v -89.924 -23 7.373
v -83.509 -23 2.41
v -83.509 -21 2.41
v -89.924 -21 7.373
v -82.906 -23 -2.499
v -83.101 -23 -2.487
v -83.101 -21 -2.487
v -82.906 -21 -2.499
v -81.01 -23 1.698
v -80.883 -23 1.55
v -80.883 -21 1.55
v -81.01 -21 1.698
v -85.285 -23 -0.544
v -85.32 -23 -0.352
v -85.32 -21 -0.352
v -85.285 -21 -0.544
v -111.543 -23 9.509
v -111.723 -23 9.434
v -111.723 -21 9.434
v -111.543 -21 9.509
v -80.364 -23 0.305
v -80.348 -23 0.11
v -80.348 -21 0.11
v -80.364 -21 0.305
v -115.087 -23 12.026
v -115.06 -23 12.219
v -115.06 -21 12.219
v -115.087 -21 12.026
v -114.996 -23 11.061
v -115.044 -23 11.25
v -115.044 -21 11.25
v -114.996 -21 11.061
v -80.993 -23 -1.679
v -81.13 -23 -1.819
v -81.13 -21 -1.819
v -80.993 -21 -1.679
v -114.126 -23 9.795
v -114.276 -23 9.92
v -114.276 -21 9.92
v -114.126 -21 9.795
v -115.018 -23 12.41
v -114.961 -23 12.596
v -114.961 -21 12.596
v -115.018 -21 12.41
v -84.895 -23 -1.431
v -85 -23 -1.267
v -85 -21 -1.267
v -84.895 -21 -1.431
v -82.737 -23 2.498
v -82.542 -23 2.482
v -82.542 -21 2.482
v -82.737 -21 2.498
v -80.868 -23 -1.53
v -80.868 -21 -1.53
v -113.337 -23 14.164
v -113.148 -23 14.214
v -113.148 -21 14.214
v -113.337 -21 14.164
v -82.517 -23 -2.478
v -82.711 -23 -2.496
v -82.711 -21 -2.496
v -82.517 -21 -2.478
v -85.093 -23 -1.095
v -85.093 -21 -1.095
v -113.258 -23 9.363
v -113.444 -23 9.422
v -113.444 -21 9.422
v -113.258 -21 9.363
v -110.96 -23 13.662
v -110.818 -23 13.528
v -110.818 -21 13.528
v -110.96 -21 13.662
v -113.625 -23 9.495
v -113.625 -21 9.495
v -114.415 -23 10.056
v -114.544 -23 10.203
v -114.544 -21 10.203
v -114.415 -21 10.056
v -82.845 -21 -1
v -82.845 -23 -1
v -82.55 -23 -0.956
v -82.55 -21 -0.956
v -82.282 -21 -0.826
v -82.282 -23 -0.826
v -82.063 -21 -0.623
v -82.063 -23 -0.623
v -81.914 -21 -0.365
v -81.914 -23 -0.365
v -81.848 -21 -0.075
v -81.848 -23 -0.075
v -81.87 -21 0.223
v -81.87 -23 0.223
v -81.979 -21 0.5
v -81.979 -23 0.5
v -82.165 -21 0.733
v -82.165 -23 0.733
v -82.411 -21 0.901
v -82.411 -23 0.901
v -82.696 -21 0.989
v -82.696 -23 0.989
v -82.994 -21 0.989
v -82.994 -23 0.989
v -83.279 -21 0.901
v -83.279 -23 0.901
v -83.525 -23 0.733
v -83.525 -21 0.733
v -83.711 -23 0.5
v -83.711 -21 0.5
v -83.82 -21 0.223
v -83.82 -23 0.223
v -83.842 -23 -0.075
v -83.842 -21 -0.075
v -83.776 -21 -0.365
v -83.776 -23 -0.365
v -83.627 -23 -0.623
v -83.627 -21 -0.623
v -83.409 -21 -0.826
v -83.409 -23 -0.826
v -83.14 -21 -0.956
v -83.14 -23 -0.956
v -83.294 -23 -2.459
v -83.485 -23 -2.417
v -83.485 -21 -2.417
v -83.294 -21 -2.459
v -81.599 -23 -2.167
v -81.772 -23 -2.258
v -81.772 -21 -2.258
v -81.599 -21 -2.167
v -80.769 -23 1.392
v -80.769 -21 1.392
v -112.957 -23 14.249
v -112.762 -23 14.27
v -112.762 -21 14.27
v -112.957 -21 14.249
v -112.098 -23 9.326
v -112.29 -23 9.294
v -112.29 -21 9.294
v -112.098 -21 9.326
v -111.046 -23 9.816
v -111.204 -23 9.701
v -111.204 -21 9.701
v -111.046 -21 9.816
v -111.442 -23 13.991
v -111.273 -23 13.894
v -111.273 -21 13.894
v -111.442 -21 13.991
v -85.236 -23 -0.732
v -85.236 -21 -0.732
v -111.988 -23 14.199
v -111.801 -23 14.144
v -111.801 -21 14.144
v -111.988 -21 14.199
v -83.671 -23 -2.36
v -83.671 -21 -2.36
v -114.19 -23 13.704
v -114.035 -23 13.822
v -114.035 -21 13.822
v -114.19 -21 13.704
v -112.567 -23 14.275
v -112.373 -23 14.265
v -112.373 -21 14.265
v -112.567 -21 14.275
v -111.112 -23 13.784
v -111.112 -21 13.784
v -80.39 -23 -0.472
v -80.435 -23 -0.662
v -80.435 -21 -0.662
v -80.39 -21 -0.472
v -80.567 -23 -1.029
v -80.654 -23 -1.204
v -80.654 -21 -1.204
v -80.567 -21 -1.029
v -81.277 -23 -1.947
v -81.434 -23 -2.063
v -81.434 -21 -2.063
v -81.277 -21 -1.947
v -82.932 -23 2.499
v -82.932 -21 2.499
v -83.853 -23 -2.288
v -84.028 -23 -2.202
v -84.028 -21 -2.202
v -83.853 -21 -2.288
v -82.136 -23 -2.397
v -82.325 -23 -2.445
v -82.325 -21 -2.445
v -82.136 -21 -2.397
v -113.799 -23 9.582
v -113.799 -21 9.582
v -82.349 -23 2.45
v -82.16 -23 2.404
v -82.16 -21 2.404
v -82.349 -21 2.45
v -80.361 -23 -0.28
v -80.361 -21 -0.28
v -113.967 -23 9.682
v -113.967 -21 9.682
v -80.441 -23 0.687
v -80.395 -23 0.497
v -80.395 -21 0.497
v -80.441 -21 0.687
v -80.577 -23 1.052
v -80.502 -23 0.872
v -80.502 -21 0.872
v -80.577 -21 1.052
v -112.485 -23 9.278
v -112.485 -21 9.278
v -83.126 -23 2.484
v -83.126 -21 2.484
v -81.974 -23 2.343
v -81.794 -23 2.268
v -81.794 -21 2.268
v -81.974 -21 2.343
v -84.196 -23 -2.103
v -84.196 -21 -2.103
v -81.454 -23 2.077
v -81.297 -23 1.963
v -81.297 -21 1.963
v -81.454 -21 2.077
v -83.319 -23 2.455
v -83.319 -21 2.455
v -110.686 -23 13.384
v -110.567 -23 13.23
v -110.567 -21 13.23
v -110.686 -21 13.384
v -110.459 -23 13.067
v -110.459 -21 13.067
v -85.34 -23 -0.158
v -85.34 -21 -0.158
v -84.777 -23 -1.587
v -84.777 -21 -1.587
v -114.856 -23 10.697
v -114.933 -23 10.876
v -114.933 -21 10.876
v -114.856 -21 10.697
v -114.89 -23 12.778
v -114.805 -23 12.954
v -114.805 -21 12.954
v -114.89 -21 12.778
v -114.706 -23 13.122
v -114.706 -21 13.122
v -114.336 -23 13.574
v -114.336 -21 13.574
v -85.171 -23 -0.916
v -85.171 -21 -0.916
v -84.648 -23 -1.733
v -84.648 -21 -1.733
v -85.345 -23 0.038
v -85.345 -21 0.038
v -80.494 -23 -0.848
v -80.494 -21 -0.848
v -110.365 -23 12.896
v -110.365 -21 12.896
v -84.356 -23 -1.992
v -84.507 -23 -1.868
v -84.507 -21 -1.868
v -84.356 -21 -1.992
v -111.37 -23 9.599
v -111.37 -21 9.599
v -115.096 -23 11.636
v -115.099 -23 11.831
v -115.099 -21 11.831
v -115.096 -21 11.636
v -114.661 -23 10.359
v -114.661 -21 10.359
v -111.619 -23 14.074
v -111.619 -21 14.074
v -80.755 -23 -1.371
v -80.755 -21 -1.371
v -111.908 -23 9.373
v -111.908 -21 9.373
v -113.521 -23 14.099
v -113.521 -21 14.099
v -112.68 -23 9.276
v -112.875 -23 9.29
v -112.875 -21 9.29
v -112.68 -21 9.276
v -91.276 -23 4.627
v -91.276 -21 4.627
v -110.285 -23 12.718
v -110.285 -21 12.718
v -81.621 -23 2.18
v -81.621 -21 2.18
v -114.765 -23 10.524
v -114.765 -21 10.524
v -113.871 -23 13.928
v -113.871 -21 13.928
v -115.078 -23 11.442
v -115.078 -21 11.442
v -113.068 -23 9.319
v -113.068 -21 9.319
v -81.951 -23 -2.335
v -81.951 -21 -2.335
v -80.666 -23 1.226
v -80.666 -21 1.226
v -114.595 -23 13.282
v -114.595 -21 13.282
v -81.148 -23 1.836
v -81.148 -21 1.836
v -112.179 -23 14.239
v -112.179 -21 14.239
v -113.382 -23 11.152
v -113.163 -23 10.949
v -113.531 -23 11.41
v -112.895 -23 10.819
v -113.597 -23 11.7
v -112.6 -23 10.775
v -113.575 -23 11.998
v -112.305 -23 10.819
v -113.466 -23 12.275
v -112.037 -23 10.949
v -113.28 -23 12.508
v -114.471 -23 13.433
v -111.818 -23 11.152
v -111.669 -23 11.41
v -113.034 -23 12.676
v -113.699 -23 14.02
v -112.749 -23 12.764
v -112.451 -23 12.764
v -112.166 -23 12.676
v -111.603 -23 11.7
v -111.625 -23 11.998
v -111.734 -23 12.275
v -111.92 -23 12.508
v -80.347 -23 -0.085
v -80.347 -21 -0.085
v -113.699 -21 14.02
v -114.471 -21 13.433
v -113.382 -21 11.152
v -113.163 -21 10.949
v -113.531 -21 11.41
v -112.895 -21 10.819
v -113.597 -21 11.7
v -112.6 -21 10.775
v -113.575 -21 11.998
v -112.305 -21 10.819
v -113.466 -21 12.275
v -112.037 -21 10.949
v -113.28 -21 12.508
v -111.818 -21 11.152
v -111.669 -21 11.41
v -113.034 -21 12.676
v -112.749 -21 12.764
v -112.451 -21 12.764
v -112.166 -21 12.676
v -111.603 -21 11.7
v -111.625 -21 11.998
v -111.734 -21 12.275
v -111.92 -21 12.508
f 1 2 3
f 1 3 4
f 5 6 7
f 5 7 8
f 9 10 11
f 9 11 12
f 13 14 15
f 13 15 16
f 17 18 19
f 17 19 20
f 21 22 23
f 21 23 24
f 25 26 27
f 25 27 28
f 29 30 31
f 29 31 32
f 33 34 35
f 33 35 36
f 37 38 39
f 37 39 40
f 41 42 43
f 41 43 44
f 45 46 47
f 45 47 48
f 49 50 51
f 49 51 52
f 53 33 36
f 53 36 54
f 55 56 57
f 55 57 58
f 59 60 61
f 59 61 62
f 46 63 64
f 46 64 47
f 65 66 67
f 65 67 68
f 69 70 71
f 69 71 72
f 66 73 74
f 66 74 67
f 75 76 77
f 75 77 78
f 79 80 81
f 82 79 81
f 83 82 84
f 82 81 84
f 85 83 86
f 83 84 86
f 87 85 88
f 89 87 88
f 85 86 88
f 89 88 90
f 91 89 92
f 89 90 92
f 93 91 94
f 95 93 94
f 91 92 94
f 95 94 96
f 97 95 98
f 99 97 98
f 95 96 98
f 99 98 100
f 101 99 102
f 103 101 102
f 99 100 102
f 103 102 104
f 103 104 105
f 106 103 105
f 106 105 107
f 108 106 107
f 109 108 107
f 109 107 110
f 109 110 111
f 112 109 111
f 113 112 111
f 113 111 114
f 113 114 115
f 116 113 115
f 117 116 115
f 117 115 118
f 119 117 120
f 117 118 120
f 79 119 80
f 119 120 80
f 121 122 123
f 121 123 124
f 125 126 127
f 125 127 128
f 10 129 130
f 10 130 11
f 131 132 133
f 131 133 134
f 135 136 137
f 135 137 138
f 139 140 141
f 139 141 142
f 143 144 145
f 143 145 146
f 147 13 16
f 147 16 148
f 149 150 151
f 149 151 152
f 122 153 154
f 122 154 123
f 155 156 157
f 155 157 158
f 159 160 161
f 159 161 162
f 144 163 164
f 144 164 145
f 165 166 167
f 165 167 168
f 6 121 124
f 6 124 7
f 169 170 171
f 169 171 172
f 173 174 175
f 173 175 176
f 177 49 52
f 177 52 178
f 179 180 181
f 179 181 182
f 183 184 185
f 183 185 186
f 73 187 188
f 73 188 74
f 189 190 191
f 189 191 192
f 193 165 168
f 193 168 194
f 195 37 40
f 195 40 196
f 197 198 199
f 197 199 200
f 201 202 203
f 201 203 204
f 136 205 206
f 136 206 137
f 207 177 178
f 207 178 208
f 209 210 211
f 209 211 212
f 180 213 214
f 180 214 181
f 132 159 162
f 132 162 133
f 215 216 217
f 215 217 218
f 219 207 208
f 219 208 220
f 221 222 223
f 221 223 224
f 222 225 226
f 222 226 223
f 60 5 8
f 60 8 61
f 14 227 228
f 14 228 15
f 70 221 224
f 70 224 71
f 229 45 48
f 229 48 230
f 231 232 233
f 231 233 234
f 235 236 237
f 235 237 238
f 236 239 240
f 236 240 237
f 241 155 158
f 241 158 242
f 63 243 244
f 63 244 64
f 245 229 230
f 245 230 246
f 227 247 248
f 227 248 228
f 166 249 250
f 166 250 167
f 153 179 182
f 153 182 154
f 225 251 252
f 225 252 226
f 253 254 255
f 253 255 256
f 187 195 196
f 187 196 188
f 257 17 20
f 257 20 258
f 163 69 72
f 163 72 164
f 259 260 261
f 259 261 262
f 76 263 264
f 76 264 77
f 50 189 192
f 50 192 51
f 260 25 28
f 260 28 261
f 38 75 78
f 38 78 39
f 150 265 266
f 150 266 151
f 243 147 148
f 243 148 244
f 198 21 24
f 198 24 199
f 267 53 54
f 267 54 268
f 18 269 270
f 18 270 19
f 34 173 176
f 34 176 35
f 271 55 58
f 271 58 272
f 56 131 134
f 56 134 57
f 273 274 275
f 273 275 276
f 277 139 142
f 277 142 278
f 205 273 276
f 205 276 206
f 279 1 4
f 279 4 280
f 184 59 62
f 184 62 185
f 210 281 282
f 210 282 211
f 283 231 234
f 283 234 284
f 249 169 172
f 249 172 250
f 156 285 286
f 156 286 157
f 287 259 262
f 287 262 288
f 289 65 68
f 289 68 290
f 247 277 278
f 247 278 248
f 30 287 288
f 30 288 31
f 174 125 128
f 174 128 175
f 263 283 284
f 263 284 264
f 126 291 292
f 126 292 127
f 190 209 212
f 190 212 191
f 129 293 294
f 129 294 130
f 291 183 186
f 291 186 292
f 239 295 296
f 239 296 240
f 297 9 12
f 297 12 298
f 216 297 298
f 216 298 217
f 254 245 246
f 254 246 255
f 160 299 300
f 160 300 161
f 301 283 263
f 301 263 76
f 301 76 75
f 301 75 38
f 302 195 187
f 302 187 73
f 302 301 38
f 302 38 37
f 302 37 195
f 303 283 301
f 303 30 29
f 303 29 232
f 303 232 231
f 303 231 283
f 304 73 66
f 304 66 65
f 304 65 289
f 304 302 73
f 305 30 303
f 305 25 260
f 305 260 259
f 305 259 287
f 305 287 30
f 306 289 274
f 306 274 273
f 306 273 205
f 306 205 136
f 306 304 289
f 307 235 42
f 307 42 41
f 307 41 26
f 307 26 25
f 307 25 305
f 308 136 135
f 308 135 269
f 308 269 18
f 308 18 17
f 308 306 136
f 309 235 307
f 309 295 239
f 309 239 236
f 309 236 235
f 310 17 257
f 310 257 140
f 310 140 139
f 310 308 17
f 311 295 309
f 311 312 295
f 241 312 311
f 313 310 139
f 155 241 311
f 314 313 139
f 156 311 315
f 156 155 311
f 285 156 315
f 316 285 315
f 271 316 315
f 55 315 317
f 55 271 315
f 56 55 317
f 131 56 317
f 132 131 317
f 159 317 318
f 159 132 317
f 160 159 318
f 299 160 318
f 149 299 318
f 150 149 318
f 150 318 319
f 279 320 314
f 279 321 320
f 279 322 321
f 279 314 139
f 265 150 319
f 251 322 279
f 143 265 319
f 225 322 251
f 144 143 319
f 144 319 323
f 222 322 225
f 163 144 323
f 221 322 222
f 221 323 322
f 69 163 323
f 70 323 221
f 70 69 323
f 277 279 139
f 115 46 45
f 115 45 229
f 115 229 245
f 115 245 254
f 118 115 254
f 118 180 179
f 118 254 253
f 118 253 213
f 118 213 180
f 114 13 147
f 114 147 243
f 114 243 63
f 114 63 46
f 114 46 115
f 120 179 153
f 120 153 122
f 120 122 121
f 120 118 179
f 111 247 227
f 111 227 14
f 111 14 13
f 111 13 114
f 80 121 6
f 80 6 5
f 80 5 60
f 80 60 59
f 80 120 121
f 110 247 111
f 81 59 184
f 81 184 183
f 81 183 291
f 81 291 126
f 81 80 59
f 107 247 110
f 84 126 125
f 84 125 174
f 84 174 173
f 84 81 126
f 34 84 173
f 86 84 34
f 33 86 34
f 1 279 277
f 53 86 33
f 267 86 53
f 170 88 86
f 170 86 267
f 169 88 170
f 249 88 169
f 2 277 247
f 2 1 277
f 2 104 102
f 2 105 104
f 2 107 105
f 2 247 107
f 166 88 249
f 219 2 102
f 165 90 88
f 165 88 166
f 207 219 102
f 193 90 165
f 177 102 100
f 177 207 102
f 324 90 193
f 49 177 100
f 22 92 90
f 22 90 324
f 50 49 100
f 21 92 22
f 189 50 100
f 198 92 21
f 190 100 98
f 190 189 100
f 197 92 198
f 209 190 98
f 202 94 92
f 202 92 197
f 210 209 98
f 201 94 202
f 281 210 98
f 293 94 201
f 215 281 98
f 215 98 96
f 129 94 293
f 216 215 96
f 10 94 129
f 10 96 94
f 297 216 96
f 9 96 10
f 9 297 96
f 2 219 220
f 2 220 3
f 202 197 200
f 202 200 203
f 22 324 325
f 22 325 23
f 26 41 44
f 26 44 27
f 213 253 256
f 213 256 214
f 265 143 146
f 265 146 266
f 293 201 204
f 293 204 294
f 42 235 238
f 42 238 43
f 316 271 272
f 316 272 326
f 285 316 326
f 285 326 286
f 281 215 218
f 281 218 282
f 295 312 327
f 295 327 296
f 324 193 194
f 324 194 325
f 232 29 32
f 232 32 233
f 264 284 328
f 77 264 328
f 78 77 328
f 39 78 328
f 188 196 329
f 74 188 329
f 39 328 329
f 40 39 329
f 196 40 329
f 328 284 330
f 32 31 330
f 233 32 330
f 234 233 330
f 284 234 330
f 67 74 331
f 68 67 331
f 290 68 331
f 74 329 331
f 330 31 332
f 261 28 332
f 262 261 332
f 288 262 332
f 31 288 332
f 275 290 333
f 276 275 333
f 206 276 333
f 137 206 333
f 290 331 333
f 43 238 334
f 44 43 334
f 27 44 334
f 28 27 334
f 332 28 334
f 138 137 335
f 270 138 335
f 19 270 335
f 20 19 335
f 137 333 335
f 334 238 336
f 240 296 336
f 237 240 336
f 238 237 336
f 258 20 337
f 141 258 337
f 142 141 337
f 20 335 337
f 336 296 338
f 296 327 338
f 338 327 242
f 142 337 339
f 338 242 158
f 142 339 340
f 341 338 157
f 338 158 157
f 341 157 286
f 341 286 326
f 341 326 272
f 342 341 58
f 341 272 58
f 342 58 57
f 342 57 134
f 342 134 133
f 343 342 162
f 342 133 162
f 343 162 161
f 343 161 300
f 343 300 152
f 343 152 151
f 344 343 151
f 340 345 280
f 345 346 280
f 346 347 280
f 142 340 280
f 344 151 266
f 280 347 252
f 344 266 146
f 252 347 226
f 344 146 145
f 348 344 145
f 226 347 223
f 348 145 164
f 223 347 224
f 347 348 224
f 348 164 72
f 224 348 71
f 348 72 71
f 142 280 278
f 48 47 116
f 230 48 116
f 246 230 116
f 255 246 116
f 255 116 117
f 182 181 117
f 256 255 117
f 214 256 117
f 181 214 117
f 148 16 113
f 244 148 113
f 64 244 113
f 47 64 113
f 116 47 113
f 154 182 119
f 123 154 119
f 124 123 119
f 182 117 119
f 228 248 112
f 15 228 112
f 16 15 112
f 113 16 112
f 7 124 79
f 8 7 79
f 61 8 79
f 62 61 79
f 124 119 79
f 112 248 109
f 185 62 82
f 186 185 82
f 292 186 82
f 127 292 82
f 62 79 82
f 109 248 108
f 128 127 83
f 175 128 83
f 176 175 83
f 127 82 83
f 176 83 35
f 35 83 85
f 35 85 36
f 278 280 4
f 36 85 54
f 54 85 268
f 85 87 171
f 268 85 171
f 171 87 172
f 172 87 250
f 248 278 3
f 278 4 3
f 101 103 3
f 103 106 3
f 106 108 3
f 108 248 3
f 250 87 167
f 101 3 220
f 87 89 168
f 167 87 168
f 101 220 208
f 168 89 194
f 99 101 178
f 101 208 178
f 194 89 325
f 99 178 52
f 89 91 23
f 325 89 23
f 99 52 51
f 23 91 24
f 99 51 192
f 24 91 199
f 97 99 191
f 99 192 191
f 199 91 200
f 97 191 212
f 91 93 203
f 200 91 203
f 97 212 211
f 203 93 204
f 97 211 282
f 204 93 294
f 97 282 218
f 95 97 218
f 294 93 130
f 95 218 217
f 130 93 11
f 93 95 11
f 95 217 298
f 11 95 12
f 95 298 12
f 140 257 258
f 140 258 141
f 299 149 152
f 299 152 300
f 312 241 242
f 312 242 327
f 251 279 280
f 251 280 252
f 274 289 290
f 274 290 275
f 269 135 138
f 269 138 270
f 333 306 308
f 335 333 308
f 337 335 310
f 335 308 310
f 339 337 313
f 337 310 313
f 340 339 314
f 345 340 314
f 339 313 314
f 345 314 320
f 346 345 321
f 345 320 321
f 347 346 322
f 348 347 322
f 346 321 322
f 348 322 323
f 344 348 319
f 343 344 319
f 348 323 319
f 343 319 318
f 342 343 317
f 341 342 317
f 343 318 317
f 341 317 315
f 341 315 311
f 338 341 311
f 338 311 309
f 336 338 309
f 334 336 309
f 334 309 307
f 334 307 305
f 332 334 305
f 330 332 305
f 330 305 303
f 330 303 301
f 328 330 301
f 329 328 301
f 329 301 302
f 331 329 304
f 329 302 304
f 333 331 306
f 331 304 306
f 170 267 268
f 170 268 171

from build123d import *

# Parameters (mm, degrees)
SKETCH_1_R      = 0.999998023
SKETCH_1_R_2    = 1.000000976
EXTRUDE_1_DEPTH = 2.000000328


with BuildPart() as part:
    # Эскиз1 → Бобышка-Вытянуть1 (new body)
    with BuildSketch(Plane.XZ.offset(23.000000045)):
        Polygon((-84.028117359, -2.202427713), (-83.852753043, -2.287971787), (-83.6712569, -2.35957955), (-83.484724164, -2.416815143), (-83.294294775, -2.45932932), (-83.101138473, -2.486863639), (-82.906417549, -2.499250229), (-82.711324096, -2.496413421), (-82.517042756, -2.478370909), (-82.324765623, -2.445232356), (-82.135654986, -2.397199627), (-81.950873137, -2.334565157), (-81.771530211, -2.257710788), (-81.598728895, -2.167104278), (-81.433527172, -2.063297899), (-81.276915967, -1.946923556), (-81.129856408, -1.818690565), (-80.993250012, -1.679379493), (-80.867916346, -1.529839239), (-80.754637718, -1.370980637), (-80.654084682, -1.203771099), (-80.566875637, -1.029229374), (-80.493554473, -0.848418393), (-80.434553325, -0.662439677), (-80.390237272, -0.472426036), (-80.360867083, -0.279534725), (-80.346636474, -0.084940737), (-80.347619951, 0.110170622), (-80.363817513, 0.304610934), (-80.395124853, 0.497195811), (-80.441370606, 0.686752202), (-80.50224185, 0.872125558), (-80.577395856, 1.052186592), (-80.666355789, 1.225838787), (-80.768592656, 1.392024336), (-80.883473158, 1.549730659), (-81.010304391, 1.697997563), (-81.148318946, 1.835921779), (-81.296652555, 1.96266314), (-81.454440951, 2.077449812), (-81.620678306, 2.17958237), (-81.794388592, 2.268439159), (-81.974491477, 2.343478147), (-82.159906626, 2.40424322), (-82.349486649, 2.450363711), (-82.542091608, 2.481558593), (-82.736544311, 2.49763811), (-82.931652665, 2.49850424), (-83.126246929, 2.484151861), (-83.319112659, 2.454668051), (-83.509102464, 2.410232788), (-89.923687279, 7.373288274), (-110.284693539, 12.718074955), (-110.365286469, 12.895765714), (-110.459499061, 13.066628017), (-110.566742718, 13.229624368), (-110.68636924, 13.383760117), (-110.817655921, 13.528098352), (-110.959798098, 13.66175618), (-111.111931503, 13.78392335), (-111.273132265, 13.893852942), (-111.442416906, 13.990878128), (-111.618742347, 14.074404724), (-111.801050603, 14.143927023), (-111.98823154, 14.199018478), (-112.179122865, 14.239346609), (-112.372592092, 14.264663681), (-112.567447126, 14.274815097), (-112.762488425, 14.269742183), (-112.956546247, 14.249472879), (-113.1484285, 14.214130118), (-113.336972892, 14.163931832), (-113.521032035, 14.099182561), (-113.699480891, 14.020276256), (-113.871231675, 13.927693479), (-114.035241306, 13.821999542), (-114.190496504, 13.703836128), (-114.336073399, 13.573925011), (-114.471077919, 13.433056884), (-114.594690502, 13.282089494), (-114.706136286, 13.121941127), (-114.804767072, 12.95358967), (-114.889964461, 12.778058648), (-114.961214364, 12.596419081), (-115.018077195, 12.409775518), (-115.060210228, 12.219266966), (-115.087367594, 12.026051059), (-115.099363029, 11.831306852), (-115.096144378, 11.636218987), (-115.077711642, 11.441977695), (-115.04419893, 11.249764822), (-114.995785058, 11.060751043), (-114.932790399, 10.876088403), (-114.855580032, 10.696900077), (-114.764630795, 10.524280369), (-114.66050148, 10.35927888), (-114.543817937, 10.202899575), (-114.415287971, 10.05609706), (-114.275708795, 9.919765405), (-114.125922322, 9.794733487), (-113.966837525, 9.681764059), (-113.79943043, 9.581544437), (-113.624714315, 9.494686499), (-113.443754613, 9.421717376), (-113.257668912, 9.363083169), (-113.067567348, 9.319140576), (-112.874612212, 9.290155955), (-112.679995596, 9.276308119), (-112.484887242, 9.277679026), (-112.290471792, 9.294263087), (-112.09795624, 9.325955994), (-111.908487976, 9.372567758), (-111.72323674, 9.433813393), (-111.54332757, 9.50931944), (-111.369848251, 9.598624893), (-111.203864217, 9.701187722), (-111.046388745, 9.816383012), (-91.276302934, 4.62671183), (-85.344910622, 0.037510123), (-85.340216756, -0.157547402), (-85.320338607, -0.351645285), (-85.285380483, -0.543601287), (-85.235551, -0.732246088), (-85.171163082, -0.916430785), (-85.092611611, -1.095033367), (-85.000365973, -1.266965992), (-84.894999862, -1.431181328), (-84.777146578, -1.586679369), (-84.647521377, -1.73251261), (-84.50692147, -1.867792918), (-84.356203675, -1.991696423), (-84.196276963, -2.10346817), align=None)
        with Locations(Location((-82.845189618, -1.945e-06, 0), (0, 0, 270))):
            Circle(SKETCH_1_R, mode=Mode.SUBTRACT)
        with Locations(Location((-112.600002971, 11.775028493, 0), (0, 0, 270))):
            Circle(SKETCH_1_R_2, mode=Mode.SUBTRACT)
    extrude(amount=-EXTRUDE_1_DEPTH)


solid = part.part
